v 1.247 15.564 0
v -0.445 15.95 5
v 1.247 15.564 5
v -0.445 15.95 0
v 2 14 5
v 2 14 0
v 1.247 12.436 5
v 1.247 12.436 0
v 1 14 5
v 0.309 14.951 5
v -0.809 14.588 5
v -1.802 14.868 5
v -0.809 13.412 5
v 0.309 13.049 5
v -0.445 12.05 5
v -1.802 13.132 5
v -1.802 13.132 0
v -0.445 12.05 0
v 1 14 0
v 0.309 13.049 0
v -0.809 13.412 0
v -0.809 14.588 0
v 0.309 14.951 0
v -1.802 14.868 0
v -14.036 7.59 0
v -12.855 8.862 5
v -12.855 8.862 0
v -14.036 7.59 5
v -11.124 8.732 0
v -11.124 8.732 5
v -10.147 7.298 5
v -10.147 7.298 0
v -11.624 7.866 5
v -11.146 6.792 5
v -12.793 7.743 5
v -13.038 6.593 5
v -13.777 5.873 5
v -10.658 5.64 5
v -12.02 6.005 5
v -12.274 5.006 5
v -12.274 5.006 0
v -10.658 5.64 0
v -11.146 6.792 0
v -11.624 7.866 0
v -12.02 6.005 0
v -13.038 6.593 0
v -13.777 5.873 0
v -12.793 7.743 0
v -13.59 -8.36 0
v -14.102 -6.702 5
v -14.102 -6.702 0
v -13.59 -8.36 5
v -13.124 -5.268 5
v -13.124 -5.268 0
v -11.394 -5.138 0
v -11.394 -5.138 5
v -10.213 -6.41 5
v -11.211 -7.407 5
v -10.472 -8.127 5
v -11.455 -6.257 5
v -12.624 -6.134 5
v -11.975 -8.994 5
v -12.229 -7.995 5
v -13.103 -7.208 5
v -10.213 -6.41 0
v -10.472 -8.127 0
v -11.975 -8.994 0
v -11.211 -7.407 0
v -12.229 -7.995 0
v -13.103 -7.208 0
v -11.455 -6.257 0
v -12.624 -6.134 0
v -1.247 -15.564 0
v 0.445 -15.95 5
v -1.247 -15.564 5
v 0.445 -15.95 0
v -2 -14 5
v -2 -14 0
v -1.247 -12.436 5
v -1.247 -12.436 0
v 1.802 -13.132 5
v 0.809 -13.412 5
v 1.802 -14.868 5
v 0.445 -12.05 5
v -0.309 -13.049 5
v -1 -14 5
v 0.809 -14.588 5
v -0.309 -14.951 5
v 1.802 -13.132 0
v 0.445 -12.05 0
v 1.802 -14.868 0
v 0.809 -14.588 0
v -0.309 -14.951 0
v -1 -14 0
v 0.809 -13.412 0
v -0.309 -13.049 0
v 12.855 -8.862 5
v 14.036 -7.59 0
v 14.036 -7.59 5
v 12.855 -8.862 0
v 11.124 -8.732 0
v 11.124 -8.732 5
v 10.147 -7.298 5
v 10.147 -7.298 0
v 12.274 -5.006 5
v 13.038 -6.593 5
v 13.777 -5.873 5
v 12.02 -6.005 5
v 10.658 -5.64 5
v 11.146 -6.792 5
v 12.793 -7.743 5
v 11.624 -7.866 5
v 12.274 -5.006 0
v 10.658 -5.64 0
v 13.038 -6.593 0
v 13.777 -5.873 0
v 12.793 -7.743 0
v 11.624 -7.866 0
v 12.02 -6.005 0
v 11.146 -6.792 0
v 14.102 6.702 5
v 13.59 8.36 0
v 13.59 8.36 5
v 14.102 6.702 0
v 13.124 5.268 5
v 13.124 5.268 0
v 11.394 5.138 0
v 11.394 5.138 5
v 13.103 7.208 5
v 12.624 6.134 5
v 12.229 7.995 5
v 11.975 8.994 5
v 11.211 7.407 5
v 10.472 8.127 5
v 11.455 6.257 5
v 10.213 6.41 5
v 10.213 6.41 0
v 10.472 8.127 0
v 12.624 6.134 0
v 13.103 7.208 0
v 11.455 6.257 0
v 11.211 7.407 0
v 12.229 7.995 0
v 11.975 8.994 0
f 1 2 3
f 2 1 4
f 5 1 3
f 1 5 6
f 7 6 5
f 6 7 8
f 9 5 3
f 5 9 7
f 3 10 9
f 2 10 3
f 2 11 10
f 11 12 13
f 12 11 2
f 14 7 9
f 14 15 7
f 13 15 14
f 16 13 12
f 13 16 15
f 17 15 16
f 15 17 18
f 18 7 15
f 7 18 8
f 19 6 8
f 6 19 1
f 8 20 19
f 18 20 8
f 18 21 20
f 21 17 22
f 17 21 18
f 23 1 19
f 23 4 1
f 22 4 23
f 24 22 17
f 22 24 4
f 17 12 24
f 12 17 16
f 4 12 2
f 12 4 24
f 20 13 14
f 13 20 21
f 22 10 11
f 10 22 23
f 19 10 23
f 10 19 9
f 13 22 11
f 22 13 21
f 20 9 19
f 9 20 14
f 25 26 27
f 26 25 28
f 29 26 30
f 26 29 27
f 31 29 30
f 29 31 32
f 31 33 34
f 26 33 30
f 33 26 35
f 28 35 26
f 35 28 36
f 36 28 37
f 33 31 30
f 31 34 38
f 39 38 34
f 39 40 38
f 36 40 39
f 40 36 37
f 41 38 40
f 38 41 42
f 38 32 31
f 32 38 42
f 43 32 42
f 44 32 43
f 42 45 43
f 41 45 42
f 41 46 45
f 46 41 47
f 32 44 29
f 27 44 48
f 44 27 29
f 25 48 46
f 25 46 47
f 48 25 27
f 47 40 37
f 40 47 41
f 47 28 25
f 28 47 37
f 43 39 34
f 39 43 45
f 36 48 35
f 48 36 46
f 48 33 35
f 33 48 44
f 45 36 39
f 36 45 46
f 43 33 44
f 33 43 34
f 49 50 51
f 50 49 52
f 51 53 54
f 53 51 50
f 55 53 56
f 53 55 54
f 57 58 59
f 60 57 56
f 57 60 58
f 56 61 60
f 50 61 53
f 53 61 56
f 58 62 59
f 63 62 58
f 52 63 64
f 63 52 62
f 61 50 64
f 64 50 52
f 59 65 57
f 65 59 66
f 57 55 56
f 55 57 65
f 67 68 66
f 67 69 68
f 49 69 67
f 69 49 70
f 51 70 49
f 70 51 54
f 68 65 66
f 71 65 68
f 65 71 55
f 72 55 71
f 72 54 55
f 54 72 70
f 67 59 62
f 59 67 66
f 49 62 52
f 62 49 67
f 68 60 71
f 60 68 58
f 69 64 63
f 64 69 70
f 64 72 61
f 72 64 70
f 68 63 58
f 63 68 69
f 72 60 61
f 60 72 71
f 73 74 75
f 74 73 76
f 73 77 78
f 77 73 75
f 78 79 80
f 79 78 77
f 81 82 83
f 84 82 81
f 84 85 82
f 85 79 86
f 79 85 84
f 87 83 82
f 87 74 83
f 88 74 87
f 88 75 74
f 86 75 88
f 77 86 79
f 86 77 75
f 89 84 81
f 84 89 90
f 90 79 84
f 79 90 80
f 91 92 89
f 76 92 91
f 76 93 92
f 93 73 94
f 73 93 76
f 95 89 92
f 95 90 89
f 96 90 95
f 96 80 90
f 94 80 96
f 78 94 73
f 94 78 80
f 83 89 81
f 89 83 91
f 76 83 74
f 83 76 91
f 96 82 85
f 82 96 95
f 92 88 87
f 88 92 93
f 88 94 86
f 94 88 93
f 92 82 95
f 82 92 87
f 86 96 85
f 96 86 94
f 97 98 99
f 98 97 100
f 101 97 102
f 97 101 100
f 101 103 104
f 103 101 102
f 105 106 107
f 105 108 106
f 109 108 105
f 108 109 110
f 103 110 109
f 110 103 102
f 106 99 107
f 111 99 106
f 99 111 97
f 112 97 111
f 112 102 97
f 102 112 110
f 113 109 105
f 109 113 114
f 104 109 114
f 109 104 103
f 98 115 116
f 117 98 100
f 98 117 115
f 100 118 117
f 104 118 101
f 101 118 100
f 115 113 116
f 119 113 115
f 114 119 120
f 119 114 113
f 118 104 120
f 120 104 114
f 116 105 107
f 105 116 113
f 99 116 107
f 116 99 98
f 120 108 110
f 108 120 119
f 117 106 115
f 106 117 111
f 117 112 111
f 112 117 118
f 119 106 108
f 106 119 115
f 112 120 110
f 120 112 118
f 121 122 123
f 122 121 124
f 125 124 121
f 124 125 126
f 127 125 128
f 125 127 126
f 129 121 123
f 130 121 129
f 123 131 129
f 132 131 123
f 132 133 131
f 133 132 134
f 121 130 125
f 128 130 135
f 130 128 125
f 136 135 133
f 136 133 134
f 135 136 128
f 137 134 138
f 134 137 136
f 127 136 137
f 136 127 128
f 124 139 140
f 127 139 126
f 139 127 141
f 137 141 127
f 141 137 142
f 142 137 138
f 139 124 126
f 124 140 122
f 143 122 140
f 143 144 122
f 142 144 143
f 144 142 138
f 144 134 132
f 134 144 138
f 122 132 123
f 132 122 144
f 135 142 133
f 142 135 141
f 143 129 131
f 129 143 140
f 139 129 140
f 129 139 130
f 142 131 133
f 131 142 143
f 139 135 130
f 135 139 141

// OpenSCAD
// file: Pipe.scad
// parameters
R_OUTER = 8;
R_INNER = 6;
HEIGHT = 10;

module Pipe(r_outer, r_inner, h) {
    difference() {
        cylinder(r=r_outer, h=h);
        cylinder(r=r_inner, h=h);
    }
}

// main
Pipe(R_OUTER, R_INNER, HEIGHT);
// main file
use <Pipe.scad>;

// parameters
NUM_CYLINDER = 6;
R_CIRCLE = 14;
R_PIPE_OUTER = 2;
R_PIPE_INNER = 1;
H_PIPE = 5;

module PipeCircle(num_cylinder, r_circle, r_pipe_outer, r_pipe_inner, h_pipe) {
    for ( i = [0 : num_cylinder] ) {
        rotate( i * 360 / num_cylinder, [0, 0, 1])
            translate([0, r_circle, 0])
                Pipe(r_outer=r_pipe_outer, r_inner=r_pipe_inner, h=h_pipe);
    }
}

// main
PipeCircle(NUM_CYLINDER, R_CIRCLE, R_PIPE_OUTER, R_PIPE_INNER, H_PIPE);
